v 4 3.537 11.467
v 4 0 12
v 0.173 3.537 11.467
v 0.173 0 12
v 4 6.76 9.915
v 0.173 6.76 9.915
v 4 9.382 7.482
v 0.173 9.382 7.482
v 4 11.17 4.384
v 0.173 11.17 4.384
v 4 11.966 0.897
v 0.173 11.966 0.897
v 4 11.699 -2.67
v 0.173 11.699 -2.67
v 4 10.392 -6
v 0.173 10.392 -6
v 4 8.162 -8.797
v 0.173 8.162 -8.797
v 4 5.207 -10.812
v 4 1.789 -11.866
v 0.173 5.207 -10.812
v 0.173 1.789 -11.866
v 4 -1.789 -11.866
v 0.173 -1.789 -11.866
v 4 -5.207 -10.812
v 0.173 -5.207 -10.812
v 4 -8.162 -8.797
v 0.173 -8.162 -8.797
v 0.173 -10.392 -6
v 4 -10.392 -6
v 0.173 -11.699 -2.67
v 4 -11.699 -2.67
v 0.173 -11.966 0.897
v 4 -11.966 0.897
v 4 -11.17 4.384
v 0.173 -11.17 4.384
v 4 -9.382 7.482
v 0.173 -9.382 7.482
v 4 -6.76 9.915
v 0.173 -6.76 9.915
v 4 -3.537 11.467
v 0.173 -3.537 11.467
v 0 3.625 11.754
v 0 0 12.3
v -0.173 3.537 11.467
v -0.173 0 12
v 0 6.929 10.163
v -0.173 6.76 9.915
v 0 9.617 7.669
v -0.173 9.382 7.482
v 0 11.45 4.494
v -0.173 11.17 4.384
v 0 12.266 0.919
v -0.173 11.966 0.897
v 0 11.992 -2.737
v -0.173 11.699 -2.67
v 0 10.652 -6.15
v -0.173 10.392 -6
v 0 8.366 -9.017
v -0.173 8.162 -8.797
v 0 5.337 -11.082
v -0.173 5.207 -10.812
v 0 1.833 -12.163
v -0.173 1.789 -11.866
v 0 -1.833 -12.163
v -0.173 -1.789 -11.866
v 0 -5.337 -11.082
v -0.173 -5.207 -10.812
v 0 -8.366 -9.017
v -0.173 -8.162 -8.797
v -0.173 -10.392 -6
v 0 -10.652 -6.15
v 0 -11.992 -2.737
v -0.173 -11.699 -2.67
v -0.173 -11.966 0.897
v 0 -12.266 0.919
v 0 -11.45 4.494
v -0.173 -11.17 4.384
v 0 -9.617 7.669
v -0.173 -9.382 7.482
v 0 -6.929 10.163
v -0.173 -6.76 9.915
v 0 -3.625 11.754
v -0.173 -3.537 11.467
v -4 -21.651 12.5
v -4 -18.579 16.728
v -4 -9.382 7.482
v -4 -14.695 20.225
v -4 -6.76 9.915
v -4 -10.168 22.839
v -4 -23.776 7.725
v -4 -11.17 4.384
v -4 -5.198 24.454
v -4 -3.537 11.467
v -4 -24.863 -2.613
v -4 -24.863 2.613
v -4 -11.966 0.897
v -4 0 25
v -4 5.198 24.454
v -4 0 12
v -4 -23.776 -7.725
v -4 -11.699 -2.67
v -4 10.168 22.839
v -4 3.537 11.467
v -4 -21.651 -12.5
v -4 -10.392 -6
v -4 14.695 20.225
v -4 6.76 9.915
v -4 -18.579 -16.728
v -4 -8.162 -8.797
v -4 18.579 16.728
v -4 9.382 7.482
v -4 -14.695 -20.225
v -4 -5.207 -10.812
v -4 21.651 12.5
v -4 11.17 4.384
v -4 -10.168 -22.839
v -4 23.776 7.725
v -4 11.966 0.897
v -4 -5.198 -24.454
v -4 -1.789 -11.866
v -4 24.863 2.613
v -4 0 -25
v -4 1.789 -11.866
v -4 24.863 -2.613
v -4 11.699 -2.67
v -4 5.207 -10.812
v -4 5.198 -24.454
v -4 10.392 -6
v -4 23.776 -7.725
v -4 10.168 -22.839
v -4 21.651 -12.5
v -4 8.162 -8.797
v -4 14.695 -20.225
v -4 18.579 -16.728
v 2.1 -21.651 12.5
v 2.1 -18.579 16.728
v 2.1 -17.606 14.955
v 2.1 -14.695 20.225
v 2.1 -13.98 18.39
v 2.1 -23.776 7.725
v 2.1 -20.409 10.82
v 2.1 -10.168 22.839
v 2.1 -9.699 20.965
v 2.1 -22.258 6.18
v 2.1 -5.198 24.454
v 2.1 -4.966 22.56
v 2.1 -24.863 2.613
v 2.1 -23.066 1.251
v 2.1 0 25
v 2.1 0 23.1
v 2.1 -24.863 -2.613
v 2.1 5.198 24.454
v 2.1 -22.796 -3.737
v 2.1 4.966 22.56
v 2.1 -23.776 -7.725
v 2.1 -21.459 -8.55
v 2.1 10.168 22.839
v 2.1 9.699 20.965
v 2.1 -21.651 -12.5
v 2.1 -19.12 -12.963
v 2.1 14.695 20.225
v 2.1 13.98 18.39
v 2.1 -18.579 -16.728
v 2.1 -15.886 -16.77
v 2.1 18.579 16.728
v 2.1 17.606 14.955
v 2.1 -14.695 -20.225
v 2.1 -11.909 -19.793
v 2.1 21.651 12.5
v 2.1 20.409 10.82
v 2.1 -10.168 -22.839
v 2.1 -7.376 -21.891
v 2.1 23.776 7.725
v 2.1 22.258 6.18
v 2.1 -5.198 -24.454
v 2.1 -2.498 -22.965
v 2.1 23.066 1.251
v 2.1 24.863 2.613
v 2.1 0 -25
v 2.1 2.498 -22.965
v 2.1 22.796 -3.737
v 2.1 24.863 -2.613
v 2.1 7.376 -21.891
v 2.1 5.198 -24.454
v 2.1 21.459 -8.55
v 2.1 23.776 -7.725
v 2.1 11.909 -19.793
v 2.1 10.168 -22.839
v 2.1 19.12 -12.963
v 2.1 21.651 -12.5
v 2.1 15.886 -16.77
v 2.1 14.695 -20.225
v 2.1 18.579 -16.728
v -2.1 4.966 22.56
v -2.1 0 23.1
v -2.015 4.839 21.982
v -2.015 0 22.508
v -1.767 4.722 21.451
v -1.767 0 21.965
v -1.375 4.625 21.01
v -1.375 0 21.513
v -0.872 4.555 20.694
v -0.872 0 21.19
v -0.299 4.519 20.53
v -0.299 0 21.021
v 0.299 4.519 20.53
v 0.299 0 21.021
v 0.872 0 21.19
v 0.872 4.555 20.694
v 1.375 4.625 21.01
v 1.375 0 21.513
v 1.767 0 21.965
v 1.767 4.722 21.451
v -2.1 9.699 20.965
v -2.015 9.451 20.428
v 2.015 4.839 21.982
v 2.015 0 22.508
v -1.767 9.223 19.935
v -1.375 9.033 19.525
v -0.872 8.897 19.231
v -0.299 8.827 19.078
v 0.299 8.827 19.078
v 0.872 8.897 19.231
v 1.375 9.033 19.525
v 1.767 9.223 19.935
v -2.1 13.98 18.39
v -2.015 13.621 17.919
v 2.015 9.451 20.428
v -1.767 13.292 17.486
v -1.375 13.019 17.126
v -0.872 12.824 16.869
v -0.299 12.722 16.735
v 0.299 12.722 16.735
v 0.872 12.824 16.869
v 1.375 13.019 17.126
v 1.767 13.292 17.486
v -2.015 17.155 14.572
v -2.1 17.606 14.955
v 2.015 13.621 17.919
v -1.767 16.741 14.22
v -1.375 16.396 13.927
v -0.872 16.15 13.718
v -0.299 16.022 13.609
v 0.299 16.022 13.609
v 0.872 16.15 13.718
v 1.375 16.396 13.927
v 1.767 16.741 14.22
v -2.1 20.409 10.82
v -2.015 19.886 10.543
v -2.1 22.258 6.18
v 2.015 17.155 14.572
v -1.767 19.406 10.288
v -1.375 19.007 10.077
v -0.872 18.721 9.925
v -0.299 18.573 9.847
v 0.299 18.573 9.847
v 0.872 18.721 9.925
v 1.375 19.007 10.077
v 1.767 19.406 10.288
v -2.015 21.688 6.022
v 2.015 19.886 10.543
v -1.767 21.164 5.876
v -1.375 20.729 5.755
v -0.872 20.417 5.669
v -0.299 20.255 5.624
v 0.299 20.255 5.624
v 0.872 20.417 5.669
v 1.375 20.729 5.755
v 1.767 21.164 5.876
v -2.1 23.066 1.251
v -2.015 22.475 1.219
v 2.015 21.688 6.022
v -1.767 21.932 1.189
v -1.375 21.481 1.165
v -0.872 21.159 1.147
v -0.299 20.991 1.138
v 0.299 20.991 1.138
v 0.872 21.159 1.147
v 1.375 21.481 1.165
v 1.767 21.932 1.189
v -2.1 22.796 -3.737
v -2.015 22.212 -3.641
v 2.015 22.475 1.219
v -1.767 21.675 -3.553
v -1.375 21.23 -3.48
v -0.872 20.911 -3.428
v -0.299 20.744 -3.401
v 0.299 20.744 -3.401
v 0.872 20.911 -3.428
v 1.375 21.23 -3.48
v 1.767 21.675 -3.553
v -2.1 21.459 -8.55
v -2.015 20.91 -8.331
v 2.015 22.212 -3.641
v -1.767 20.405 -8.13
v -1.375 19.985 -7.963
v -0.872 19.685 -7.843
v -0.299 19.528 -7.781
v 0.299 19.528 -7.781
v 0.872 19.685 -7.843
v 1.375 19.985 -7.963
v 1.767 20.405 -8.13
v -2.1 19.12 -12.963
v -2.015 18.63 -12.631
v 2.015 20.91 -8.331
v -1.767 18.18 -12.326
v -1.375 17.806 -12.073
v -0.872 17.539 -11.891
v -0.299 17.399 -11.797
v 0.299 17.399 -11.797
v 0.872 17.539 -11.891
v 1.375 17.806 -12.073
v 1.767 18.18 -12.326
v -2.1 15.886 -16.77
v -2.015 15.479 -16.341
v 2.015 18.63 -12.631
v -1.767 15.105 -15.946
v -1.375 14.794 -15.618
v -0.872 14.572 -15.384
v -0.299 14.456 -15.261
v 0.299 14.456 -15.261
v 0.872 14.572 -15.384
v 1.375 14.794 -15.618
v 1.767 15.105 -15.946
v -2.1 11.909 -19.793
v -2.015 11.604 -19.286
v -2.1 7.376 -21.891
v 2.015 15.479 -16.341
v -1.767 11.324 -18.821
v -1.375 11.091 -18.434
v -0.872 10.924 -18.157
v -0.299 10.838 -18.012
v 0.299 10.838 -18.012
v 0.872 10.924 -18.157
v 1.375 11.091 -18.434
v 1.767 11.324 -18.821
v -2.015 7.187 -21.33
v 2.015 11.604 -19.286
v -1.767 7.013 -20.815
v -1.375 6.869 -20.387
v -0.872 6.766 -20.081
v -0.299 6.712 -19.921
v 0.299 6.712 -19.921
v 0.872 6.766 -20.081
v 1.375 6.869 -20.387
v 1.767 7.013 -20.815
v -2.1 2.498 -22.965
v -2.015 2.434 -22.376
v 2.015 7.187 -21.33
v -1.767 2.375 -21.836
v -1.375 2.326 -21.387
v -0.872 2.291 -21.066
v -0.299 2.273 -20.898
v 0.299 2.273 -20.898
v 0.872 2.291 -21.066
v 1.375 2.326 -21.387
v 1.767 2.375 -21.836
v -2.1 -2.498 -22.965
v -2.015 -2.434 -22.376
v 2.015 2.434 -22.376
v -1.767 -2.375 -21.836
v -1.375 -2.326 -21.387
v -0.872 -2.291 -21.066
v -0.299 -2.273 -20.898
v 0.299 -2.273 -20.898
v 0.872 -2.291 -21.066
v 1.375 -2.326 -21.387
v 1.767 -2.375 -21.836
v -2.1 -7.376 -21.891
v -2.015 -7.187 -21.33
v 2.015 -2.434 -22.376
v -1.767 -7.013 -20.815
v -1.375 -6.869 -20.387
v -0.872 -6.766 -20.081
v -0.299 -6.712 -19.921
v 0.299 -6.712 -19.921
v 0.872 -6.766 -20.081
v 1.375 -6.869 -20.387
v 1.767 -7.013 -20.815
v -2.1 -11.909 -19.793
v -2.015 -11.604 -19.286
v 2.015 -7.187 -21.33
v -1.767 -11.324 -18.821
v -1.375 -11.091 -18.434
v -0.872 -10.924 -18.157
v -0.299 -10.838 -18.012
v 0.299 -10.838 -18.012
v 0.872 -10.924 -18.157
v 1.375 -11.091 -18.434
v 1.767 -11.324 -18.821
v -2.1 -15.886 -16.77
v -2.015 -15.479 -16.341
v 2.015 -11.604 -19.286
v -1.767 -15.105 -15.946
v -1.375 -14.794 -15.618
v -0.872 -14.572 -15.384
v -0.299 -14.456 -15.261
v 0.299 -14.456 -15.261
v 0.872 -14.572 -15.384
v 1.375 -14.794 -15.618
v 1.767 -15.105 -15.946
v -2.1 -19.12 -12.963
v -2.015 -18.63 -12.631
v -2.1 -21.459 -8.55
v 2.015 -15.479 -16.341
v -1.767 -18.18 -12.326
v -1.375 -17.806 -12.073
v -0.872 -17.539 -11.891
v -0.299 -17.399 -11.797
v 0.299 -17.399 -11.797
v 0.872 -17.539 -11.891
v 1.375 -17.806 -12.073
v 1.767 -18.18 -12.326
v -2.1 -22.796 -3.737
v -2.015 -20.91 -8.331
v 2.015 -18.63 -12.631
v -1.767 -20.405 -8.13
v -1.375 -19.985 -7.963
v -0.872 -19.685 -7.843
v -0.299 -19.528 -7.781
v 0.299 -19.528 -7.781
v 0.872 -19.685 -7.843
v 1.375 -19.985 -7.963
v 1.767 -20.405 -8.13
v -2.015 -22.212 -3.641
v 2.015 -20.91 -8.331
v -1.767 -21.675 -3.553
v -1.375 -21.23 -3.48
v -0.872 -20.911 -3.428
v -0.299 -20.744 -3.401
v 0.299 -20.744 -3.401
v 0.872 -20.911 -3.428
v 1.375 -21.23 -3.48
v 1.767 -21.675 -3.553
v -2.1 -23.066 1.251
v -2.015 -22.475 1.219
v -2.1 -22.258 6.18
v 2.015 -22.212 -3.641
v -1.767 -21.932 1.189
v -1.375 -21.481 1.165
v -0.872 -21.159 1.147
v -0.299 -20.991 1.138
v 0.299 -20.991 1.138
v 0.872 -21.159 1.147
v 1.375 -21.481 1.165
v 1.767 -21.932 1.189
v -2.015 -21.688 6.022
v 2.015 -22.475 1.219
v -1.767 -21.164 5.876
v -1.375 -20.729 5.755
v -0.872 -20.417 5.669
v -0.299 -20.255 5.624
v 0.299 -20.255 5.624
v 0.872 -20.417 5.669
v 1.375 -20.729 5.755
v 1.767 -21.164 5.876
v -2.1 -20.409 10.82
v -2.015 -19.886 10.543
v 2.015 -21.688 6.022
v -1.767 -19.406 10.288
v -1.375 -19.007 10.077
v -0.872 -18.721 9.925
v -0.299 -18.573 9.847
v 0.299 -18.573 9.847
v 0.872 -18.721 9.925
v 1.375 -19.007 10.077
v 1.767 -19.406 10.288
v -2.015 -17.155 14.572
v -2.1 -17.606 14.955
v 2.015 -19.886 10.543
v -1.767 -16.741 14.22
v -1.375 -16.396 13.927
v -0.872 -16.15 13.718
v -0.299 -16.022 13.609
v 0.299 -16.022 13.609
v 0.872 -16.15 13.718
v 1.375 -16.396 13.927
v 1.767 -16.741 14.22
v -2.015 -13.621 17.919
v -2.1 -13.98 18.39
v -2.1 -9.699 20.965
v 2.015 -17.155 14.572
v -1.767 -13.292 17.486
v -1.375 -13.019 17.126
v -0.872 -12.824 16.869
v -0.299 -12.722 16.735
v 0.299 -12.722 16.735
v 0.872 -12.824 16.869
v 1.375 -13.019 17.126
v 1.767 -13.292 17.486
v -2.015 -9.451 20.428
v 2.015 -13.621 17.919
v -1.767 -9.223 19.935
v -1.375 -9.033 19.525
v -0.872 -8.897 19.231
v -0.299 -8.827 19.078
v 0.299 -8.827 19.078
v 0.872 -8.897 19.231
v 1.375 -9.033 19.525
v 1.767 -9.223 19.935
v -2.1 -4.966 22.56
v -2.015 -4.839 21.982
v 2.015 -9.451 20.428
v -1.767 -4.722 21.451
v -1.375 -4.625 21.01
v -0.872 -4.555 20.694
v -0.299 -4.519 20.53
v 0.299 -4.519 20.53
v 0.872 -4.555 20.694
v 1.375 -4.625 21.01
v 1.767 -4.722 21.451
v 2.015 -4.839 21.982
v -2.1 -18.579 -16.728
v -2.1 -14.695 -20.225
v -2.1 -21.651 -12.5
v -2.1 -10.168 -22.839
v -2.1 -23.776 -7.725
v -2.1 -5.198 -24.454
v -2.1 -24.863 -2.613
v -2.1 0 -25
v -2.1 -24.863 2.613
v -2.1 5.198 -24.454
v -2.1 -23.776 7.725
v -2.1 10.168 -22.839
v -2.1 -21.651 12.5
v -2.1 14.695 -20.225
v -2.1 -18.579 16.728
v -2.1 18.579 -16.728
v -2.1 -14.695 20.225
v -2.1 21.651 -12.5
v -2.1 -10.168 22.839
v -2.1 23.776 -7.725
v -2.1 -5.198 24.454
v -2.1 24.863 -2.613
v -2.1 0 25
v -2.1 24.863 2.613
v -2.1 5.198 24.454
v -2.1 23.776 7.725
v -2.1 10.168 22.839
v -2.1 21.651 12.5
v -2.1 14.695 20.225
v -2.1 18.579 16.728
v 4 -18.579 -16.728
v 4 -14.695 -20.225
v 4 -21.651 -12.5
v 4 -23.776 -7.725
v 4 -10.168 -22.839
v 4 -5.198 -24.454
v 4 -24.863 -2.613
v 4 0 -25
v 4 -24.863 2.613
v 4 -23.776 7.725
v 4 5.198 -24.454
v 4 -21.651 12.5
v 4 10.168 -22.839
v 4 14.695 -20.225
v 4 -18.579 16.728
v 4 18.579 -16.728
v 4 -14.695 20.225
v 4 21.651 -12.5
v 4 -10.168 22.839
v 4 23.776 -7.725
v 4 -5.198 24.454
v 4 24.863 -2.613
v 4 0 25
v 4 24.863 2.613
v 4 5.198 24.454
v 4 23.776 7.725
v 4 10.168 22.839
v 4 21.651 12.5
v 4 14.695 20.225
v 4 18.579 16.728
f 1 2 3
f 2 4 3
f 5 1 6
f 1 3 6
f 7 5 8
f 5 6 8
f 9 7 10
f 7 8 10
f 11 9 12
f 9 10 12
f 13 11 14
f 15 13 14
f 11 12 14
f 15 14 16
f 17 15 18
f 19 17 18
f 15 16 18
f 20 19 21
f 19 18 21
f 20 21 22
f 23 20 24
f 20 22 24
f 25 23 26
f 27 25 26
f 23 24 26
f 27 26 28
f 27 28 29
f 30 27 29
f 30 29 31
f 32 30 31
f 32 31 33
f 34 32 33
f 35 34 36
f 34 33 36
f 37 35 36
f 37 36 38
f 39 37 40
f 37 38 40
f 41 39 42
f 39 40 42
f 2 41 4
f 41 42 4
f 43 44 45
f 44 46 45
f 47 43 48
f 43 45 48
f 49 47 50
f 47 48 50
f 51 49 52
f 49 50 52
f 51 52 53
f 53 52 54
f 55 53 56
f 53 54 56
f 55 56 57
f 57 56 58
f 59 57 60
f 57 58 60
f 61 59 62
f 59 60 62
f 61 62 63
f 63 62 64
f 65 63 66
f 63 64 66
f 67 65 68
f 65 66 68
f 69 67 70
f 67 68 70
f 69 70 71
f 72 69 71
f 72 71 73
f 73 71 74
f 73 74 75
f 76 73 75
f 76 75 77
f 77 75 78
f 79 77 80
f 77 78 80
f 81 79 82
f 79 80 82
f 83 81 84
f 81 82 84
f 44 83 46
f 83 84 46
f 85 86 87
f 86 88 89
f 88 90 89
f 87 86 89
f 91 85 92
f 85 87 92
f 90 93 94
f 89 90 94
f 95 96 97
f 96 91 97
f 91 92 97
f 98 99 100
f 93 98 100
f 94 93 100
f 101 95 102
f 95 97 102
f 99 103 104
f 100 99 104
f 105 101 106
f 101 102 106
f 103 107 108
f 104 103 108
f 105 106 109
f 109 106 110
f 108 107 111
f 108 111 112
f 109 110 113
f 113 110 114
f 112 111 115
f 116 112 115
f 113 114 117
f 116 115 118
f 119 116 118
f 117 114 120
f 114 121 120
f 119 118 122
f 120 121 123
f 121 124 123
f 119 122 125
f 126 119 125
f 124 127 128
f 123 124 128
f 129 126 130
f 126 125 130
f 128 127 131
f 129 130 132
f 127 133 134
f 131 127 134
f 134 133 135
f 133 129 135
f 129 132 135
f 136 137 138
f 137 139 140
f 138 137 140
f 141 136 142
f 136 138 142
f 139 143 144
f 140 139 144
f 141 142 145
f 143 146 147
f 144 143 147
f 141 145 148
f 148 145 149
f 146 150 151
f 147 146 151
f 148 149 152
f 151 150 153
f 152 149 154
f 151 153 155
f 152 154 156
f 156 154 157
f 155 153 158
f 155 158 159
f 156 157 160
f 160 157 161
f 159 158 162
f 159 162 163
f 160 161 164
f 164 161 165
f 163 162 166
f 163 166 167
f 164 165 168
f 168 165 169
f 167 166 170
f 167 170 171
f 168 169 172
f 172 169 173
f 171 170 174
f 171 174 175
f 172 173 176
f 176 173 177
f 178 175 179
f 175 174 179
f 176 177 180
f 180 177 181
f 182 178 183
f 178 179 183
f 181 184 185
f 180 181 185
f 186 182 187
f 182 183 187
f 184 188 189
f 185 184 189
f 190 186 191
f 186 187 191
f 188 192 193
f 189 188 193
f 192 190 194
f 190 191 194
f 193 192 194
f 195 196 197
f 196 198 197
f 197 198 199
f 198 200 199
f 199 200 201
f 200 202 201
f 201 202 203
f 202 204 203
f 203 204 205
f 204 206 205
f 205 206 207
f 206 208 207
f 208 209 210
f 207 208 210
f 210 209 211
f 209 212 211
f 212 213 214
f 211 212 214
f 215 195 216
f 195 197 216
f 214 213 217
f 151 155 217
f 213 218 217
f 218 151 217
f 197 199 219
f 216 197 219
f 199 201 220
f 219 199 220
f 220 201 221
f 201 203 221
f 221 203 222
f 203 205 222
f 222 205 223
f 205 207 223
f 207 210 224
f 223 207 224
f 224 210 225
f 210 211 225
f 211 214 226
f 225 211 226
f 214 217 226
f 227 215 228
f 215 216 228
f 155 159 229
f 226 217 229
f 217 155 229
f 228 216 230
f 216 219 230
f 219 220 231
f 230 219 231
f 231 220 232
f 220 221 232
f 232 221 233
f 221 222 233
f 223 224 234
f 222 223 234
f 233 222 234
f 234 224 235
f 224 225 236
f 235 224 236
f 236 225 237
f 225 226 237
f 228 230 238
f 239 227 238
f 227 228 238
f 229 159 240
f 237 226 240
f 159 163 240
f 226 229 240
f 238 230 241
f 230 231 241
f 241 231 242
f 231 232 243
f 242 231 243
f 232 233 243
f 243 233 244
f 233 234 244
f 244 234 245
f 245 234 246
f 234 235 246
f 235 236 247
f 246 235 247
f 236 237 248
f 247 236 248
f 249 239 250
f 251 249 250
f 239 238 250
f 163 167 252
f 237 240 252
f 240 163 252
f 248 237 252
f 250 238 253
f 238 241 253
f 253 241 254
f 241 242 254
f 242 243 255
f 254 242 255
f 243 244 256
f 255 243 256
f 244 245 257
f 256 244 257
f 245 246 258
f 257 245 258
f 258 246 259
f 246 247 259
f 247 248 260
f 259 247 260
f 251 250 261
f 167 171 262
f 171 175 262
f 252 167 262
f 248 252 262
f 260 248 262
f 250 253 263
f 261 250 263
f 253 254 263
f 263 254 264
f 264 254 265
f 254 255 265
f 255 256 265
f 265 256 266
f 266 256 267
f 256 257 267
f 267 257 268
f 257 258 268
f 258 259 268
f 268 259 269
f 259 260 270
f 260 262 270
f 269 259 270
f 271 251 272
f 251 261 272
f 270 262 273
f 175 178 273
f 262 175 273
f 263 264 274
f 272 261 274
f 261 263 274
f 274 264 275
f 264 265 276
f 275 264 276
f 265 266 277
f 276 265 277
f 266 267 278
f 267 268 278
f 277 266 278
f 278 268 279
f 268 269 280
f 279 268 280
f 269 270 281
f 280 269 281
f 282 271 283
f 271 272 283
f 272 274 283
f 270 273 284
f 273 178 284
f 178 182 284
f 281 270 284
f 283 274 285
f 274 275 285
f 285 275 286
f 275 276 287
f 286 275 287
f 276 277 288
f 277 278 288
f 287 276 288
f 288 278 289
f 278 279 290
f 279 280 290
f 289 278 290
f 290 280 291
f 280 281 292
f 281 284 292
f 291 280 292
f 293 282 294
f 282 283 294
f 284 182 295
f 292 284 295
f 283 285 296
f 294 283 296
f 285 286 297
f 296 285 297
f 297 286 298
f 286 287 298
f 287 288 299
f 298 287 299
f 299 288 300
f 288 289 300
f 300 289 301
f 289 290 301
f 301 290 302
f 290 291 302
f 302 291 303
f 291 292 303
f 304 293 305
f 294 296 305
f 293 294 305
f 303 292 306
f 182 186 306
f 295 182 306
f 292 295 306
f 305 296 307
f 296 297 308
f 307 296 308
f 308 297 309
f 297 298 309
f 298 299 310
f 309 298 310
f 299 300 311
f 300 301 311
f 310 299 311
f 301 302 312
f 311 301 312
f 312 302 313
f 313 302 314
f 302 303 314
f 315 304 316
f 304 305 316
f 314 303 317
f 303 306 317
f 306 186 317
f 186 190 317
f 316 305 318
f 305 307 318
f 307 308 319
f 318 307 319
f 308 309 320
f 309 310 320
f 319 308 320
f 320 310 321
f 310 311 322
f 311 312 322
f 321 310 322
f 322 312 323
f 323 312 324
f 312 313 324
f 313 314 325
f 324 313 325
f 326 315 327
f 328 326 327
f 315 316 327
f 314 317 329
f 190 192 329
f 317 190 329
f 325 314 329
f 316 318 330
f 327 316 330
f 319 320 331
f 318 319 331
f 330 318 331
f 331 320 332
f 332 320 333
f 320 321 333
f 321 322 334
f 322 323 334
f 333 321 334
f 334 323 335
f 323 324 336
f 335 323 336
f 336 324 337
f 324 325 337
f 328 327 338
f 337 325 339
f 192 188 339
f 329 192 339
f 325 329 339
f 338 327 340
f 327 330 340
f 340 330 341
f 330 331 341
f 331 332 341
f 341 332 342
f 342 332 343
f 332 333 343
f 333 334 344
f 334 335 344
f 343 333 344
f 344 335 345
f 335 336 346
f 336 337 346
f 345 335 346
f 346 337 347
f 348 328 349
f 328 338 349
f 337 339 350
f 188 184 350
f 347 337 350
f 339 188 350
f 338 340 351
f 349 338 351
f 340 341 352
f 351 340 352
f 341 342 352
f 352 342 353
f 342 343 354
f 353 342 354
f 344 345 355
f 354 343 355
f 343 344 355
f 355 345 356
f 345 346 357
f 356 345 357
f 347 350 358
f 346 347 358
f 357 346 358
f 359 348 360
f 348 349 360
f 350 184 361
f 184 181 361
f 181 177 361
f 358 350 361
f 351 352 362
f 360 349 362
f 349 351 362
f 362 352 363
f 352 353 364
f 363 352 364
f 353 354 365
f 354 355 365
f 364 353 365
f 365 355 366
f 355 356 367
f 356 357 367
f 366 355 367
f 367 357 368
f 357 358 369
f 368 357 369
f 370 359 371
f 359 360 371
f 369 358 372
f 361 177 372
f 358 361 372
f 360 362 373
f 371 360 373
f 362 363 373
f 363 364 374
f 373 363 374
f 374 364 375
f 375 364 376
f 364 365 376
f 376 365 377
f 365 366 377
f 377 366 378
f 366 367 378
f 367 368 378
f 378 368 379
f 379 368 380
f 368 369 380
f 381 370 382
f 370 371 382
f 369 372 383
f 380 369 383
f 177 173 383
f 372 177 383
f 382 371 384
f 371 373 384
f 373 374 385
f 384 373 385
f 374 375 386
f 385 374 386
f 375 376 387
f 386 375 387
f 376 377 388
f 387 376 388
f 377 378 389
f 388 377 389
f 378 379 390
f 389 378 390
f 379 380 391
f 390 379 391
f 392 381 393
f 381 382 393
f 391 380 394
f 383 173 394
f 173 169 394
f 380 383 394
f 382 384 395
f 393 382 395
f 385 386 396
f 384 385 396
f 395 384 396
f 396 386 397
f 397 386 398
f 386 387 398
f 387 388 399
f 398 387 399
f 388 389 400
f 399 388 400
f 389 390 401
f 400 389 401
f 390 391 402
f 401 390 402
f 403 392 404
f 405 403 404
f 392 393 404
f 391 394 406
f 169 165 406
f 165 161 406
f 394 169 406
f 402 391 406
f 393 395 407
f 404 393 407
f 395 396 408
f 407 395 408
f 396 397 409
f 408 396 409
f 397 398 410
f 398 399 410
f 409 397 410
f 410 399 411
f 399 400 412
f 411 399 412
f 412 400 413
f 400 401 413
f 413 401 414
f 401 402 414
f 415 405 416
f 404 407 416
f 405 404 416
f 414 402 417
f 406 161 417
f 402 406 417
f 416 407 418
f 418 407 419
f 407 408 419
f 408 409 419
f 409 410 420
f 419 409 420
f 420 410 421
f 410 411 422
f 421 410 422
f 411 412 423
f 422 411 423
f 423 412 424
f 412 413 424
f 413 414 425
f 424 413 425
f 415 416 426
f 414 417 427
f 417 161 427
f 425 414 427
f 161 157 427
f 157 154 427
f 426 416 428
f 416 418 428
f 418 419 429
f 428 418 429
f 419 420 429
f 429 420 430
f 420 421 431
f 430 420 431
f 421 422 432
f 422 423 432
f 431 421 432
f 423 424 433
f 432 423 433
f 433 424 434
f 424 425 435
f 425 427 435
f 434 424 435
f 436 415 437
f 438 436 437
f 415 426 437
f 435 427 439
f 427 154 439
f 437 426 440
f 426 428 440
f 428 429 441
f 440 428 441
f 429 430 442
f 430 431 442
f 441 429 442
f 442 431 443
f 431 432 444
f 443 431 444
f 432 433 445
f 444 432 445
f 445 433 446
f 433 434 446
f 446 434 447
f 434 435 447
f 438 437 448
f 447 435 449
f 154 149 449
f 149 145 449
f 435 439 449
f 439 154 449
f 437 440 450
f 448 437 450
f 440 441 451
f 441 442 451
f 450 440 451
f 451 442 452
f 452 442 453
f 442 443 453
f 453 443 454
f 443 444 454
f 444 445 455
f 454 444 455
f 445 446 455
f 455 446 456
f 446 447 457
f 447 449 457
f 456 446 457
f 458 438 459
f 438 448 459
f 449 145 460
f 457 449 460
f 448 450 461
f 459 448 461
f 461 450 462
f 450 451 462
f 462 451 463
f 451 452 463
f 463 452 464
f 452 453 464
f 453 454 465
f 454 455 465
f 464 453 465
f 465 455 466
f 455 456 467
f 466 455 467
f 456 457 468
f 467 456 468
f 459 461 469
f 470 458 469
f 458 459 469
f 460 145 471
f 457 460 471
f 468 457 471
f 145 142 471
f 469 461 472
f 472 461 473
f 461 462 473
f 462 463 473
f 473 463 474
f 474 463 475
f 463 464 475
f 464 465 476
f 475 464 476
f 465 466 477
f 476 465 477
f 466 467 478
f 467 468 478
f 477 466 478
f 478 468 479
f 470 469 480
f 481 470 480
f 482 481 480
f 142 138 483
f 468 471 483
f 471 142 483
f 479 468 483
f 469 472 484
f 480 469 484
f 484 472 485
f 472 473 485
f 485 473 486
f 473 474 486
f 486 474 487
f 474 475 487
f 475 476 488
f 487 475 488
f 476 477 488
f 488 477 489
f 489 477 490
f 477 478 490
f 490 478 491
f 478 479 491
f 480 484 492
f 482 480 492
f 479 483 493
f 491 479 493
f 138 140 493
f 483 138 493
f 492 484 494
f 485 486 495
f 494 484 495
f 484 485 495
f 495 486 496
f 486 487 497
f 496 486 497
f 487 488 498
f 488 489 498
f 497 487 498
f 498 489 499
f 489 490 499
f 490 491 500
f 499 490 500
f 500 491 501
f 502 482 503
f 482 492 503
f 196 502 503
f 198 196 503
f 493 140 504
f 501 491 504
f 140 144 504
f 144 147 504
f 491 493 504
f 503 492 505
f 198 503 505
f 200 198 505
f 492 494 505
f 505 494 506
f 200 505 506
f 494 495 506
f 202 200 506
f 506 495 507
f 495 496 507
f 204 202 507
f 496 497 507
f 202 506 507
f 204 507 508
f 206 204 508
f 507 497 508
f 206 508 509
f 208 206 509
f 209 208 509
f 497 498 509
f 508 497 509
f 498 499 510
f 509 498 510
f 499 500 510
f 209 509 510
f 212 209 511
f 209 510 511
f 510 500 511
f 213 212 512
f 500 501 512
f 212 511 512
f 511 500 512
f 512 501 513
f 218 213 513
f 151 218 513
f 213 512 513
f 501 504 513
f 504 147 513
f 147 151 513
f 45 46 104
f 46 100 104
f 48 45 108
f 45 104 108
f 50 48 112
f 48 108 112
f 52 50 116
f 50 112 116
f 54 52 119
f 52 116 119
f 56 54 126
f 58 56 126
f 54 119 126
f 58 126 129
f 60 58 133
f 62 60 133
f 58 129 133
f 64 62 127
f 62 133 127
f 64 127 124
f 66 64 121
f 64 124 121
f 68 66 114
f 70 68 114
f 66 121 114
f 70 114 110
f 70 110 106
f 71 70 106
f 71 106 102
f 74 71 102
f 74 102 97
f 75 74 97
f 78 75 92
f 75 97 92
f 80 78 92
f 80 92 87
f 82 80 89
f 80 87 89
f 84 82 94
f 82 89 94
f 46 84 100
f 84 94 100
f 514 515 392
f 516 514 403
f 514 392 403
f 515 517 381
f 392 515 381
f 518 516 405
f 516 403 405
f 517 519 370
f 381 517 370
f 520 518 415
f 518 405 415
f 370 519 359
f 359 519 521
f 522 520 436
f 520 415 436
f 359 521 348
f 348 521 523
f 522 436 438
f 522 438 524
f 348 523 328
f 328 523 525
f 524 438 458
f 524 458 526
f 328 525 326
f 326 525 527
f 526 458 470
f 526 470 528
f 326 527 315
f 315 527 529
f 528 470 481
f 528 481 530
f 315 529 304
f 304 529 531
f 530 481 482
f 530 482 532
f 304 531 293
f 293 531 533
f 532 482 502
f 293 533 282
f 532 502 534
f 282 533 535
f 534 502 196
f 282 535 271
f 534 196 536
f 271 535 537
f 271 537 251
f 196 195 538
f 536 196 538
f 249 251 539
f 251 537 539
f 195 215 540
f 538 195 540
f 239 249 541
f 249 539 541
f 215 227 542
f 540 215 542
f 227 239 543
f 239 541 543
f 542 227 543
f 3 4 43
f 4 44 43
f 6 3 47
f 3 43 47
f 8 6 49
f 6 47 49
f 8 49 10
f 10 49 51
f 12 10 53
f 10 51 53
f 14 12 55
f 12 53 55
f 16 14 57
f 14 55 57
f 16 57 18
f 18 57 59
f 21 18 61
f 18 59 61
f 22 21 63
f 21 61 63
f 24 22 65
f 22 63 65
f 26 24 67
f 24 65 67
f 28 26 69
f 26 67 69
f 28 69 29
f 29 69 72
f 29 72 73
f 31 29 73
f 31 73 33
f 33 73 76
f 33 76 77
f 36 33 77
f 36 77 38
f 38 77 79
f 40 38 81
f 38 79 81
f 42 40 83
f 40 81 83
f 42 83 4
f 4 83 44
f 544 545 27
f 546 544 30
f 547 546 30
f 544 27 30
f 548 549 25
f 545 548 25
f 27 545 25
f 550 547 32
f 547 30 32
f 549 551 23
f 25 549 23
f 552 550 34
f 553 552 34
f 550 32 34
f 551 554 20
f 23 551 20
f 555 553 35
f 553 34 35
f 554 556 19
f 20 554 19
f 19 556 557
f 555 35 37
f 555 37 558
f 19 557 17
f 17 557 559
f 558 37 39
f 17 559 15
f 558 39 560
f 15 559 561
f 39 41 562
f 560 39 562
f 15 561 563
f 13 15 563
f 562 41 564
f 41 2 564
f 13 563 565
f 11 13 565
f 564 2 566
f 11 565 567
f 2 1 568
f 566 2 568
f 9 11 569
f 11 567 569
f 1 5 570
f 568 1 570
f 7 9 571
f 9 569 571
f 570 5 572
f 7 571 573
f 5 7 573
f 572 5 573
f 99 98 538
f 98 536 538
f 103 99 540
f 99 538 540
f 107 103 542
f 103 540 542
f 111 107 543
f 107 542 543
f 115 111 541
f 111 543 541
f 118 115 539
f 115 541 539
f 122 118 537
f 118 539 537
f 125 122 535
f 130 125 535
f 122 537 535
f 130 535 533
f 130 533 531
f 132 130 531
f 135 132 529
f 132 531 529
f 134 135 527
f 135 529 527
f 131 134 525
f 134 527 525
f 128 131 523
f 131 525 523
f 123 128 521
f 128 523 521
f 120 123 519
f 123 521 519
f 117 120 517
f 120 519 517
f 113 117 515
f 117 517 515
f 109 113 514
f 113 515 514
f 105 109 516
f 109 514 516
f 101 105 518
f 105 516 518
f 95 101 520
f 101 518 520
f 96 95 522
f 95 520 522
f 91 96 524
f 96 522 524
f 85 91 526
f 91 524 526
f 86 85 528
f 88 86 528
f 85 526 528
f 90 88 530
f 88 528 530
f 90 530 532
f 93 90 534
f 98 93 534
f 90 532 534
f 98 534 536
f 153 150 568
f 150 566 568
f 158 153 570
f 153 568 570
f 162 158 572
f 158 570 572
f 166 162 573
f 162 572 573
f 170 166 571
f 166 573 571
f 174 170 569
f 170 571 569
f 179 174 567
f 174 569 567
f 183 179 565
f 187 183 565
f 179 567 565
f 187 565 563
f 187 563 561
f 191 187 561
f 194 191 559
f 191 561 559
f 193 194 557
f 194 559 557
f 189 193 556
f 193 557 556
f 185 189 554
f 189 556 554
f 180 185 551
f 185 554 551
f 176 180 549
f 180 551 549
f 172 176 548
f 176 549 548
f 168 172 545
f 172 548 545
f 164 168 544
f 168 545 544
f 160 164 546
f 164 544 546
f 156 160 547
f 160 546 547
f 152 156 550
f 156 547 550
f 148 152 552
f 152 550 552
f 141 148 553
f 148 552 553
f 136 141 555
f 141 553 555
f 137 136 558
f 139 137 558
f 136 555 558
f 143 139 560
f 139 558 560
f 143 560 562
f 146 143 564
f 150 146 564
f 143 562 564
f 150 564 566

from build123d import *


with BuildPart() as part:
    # Sketch1 → Revolve1 (revolve)
    with BuildSketch(Plane(origin=(0, 0, 0), x_dir=(-1, 0, 0), z_dir=(0, 0, -1)), mode=Mode.PRIVATE) as revolve1_sk:
        with BuildLine():
            Line((4, 25), (2.1, 25))
            Line((2.1, 25), (2.1, 23.1))
            ThreePointArc((2.1, 23.1), (0, 21), (-2.1, 23.1))
            Line((-2.1, 23.1), (-2.1, 25))
            Line((-2.1, 25), (-4, 25))
            Line((-4, 25), (-4, 12))
            Line((-4, 12), (-0.173205081, 12))
            Line((-0.173205081, 12), (0, 12.3))
            Line((0, 12.3), (0.173205081, 12))
            Line((0.173205081, 12), (4, 12))
            Line((4, 12), (4, 25))
        make_face()
    revolve(revolve1_sk.sketch.rotate(Axis((3, 0, 0), (-1, 0, 0)), 270), axis=Axis((3, 0, 0), (-1, 0, 0)))


solid = part.part
